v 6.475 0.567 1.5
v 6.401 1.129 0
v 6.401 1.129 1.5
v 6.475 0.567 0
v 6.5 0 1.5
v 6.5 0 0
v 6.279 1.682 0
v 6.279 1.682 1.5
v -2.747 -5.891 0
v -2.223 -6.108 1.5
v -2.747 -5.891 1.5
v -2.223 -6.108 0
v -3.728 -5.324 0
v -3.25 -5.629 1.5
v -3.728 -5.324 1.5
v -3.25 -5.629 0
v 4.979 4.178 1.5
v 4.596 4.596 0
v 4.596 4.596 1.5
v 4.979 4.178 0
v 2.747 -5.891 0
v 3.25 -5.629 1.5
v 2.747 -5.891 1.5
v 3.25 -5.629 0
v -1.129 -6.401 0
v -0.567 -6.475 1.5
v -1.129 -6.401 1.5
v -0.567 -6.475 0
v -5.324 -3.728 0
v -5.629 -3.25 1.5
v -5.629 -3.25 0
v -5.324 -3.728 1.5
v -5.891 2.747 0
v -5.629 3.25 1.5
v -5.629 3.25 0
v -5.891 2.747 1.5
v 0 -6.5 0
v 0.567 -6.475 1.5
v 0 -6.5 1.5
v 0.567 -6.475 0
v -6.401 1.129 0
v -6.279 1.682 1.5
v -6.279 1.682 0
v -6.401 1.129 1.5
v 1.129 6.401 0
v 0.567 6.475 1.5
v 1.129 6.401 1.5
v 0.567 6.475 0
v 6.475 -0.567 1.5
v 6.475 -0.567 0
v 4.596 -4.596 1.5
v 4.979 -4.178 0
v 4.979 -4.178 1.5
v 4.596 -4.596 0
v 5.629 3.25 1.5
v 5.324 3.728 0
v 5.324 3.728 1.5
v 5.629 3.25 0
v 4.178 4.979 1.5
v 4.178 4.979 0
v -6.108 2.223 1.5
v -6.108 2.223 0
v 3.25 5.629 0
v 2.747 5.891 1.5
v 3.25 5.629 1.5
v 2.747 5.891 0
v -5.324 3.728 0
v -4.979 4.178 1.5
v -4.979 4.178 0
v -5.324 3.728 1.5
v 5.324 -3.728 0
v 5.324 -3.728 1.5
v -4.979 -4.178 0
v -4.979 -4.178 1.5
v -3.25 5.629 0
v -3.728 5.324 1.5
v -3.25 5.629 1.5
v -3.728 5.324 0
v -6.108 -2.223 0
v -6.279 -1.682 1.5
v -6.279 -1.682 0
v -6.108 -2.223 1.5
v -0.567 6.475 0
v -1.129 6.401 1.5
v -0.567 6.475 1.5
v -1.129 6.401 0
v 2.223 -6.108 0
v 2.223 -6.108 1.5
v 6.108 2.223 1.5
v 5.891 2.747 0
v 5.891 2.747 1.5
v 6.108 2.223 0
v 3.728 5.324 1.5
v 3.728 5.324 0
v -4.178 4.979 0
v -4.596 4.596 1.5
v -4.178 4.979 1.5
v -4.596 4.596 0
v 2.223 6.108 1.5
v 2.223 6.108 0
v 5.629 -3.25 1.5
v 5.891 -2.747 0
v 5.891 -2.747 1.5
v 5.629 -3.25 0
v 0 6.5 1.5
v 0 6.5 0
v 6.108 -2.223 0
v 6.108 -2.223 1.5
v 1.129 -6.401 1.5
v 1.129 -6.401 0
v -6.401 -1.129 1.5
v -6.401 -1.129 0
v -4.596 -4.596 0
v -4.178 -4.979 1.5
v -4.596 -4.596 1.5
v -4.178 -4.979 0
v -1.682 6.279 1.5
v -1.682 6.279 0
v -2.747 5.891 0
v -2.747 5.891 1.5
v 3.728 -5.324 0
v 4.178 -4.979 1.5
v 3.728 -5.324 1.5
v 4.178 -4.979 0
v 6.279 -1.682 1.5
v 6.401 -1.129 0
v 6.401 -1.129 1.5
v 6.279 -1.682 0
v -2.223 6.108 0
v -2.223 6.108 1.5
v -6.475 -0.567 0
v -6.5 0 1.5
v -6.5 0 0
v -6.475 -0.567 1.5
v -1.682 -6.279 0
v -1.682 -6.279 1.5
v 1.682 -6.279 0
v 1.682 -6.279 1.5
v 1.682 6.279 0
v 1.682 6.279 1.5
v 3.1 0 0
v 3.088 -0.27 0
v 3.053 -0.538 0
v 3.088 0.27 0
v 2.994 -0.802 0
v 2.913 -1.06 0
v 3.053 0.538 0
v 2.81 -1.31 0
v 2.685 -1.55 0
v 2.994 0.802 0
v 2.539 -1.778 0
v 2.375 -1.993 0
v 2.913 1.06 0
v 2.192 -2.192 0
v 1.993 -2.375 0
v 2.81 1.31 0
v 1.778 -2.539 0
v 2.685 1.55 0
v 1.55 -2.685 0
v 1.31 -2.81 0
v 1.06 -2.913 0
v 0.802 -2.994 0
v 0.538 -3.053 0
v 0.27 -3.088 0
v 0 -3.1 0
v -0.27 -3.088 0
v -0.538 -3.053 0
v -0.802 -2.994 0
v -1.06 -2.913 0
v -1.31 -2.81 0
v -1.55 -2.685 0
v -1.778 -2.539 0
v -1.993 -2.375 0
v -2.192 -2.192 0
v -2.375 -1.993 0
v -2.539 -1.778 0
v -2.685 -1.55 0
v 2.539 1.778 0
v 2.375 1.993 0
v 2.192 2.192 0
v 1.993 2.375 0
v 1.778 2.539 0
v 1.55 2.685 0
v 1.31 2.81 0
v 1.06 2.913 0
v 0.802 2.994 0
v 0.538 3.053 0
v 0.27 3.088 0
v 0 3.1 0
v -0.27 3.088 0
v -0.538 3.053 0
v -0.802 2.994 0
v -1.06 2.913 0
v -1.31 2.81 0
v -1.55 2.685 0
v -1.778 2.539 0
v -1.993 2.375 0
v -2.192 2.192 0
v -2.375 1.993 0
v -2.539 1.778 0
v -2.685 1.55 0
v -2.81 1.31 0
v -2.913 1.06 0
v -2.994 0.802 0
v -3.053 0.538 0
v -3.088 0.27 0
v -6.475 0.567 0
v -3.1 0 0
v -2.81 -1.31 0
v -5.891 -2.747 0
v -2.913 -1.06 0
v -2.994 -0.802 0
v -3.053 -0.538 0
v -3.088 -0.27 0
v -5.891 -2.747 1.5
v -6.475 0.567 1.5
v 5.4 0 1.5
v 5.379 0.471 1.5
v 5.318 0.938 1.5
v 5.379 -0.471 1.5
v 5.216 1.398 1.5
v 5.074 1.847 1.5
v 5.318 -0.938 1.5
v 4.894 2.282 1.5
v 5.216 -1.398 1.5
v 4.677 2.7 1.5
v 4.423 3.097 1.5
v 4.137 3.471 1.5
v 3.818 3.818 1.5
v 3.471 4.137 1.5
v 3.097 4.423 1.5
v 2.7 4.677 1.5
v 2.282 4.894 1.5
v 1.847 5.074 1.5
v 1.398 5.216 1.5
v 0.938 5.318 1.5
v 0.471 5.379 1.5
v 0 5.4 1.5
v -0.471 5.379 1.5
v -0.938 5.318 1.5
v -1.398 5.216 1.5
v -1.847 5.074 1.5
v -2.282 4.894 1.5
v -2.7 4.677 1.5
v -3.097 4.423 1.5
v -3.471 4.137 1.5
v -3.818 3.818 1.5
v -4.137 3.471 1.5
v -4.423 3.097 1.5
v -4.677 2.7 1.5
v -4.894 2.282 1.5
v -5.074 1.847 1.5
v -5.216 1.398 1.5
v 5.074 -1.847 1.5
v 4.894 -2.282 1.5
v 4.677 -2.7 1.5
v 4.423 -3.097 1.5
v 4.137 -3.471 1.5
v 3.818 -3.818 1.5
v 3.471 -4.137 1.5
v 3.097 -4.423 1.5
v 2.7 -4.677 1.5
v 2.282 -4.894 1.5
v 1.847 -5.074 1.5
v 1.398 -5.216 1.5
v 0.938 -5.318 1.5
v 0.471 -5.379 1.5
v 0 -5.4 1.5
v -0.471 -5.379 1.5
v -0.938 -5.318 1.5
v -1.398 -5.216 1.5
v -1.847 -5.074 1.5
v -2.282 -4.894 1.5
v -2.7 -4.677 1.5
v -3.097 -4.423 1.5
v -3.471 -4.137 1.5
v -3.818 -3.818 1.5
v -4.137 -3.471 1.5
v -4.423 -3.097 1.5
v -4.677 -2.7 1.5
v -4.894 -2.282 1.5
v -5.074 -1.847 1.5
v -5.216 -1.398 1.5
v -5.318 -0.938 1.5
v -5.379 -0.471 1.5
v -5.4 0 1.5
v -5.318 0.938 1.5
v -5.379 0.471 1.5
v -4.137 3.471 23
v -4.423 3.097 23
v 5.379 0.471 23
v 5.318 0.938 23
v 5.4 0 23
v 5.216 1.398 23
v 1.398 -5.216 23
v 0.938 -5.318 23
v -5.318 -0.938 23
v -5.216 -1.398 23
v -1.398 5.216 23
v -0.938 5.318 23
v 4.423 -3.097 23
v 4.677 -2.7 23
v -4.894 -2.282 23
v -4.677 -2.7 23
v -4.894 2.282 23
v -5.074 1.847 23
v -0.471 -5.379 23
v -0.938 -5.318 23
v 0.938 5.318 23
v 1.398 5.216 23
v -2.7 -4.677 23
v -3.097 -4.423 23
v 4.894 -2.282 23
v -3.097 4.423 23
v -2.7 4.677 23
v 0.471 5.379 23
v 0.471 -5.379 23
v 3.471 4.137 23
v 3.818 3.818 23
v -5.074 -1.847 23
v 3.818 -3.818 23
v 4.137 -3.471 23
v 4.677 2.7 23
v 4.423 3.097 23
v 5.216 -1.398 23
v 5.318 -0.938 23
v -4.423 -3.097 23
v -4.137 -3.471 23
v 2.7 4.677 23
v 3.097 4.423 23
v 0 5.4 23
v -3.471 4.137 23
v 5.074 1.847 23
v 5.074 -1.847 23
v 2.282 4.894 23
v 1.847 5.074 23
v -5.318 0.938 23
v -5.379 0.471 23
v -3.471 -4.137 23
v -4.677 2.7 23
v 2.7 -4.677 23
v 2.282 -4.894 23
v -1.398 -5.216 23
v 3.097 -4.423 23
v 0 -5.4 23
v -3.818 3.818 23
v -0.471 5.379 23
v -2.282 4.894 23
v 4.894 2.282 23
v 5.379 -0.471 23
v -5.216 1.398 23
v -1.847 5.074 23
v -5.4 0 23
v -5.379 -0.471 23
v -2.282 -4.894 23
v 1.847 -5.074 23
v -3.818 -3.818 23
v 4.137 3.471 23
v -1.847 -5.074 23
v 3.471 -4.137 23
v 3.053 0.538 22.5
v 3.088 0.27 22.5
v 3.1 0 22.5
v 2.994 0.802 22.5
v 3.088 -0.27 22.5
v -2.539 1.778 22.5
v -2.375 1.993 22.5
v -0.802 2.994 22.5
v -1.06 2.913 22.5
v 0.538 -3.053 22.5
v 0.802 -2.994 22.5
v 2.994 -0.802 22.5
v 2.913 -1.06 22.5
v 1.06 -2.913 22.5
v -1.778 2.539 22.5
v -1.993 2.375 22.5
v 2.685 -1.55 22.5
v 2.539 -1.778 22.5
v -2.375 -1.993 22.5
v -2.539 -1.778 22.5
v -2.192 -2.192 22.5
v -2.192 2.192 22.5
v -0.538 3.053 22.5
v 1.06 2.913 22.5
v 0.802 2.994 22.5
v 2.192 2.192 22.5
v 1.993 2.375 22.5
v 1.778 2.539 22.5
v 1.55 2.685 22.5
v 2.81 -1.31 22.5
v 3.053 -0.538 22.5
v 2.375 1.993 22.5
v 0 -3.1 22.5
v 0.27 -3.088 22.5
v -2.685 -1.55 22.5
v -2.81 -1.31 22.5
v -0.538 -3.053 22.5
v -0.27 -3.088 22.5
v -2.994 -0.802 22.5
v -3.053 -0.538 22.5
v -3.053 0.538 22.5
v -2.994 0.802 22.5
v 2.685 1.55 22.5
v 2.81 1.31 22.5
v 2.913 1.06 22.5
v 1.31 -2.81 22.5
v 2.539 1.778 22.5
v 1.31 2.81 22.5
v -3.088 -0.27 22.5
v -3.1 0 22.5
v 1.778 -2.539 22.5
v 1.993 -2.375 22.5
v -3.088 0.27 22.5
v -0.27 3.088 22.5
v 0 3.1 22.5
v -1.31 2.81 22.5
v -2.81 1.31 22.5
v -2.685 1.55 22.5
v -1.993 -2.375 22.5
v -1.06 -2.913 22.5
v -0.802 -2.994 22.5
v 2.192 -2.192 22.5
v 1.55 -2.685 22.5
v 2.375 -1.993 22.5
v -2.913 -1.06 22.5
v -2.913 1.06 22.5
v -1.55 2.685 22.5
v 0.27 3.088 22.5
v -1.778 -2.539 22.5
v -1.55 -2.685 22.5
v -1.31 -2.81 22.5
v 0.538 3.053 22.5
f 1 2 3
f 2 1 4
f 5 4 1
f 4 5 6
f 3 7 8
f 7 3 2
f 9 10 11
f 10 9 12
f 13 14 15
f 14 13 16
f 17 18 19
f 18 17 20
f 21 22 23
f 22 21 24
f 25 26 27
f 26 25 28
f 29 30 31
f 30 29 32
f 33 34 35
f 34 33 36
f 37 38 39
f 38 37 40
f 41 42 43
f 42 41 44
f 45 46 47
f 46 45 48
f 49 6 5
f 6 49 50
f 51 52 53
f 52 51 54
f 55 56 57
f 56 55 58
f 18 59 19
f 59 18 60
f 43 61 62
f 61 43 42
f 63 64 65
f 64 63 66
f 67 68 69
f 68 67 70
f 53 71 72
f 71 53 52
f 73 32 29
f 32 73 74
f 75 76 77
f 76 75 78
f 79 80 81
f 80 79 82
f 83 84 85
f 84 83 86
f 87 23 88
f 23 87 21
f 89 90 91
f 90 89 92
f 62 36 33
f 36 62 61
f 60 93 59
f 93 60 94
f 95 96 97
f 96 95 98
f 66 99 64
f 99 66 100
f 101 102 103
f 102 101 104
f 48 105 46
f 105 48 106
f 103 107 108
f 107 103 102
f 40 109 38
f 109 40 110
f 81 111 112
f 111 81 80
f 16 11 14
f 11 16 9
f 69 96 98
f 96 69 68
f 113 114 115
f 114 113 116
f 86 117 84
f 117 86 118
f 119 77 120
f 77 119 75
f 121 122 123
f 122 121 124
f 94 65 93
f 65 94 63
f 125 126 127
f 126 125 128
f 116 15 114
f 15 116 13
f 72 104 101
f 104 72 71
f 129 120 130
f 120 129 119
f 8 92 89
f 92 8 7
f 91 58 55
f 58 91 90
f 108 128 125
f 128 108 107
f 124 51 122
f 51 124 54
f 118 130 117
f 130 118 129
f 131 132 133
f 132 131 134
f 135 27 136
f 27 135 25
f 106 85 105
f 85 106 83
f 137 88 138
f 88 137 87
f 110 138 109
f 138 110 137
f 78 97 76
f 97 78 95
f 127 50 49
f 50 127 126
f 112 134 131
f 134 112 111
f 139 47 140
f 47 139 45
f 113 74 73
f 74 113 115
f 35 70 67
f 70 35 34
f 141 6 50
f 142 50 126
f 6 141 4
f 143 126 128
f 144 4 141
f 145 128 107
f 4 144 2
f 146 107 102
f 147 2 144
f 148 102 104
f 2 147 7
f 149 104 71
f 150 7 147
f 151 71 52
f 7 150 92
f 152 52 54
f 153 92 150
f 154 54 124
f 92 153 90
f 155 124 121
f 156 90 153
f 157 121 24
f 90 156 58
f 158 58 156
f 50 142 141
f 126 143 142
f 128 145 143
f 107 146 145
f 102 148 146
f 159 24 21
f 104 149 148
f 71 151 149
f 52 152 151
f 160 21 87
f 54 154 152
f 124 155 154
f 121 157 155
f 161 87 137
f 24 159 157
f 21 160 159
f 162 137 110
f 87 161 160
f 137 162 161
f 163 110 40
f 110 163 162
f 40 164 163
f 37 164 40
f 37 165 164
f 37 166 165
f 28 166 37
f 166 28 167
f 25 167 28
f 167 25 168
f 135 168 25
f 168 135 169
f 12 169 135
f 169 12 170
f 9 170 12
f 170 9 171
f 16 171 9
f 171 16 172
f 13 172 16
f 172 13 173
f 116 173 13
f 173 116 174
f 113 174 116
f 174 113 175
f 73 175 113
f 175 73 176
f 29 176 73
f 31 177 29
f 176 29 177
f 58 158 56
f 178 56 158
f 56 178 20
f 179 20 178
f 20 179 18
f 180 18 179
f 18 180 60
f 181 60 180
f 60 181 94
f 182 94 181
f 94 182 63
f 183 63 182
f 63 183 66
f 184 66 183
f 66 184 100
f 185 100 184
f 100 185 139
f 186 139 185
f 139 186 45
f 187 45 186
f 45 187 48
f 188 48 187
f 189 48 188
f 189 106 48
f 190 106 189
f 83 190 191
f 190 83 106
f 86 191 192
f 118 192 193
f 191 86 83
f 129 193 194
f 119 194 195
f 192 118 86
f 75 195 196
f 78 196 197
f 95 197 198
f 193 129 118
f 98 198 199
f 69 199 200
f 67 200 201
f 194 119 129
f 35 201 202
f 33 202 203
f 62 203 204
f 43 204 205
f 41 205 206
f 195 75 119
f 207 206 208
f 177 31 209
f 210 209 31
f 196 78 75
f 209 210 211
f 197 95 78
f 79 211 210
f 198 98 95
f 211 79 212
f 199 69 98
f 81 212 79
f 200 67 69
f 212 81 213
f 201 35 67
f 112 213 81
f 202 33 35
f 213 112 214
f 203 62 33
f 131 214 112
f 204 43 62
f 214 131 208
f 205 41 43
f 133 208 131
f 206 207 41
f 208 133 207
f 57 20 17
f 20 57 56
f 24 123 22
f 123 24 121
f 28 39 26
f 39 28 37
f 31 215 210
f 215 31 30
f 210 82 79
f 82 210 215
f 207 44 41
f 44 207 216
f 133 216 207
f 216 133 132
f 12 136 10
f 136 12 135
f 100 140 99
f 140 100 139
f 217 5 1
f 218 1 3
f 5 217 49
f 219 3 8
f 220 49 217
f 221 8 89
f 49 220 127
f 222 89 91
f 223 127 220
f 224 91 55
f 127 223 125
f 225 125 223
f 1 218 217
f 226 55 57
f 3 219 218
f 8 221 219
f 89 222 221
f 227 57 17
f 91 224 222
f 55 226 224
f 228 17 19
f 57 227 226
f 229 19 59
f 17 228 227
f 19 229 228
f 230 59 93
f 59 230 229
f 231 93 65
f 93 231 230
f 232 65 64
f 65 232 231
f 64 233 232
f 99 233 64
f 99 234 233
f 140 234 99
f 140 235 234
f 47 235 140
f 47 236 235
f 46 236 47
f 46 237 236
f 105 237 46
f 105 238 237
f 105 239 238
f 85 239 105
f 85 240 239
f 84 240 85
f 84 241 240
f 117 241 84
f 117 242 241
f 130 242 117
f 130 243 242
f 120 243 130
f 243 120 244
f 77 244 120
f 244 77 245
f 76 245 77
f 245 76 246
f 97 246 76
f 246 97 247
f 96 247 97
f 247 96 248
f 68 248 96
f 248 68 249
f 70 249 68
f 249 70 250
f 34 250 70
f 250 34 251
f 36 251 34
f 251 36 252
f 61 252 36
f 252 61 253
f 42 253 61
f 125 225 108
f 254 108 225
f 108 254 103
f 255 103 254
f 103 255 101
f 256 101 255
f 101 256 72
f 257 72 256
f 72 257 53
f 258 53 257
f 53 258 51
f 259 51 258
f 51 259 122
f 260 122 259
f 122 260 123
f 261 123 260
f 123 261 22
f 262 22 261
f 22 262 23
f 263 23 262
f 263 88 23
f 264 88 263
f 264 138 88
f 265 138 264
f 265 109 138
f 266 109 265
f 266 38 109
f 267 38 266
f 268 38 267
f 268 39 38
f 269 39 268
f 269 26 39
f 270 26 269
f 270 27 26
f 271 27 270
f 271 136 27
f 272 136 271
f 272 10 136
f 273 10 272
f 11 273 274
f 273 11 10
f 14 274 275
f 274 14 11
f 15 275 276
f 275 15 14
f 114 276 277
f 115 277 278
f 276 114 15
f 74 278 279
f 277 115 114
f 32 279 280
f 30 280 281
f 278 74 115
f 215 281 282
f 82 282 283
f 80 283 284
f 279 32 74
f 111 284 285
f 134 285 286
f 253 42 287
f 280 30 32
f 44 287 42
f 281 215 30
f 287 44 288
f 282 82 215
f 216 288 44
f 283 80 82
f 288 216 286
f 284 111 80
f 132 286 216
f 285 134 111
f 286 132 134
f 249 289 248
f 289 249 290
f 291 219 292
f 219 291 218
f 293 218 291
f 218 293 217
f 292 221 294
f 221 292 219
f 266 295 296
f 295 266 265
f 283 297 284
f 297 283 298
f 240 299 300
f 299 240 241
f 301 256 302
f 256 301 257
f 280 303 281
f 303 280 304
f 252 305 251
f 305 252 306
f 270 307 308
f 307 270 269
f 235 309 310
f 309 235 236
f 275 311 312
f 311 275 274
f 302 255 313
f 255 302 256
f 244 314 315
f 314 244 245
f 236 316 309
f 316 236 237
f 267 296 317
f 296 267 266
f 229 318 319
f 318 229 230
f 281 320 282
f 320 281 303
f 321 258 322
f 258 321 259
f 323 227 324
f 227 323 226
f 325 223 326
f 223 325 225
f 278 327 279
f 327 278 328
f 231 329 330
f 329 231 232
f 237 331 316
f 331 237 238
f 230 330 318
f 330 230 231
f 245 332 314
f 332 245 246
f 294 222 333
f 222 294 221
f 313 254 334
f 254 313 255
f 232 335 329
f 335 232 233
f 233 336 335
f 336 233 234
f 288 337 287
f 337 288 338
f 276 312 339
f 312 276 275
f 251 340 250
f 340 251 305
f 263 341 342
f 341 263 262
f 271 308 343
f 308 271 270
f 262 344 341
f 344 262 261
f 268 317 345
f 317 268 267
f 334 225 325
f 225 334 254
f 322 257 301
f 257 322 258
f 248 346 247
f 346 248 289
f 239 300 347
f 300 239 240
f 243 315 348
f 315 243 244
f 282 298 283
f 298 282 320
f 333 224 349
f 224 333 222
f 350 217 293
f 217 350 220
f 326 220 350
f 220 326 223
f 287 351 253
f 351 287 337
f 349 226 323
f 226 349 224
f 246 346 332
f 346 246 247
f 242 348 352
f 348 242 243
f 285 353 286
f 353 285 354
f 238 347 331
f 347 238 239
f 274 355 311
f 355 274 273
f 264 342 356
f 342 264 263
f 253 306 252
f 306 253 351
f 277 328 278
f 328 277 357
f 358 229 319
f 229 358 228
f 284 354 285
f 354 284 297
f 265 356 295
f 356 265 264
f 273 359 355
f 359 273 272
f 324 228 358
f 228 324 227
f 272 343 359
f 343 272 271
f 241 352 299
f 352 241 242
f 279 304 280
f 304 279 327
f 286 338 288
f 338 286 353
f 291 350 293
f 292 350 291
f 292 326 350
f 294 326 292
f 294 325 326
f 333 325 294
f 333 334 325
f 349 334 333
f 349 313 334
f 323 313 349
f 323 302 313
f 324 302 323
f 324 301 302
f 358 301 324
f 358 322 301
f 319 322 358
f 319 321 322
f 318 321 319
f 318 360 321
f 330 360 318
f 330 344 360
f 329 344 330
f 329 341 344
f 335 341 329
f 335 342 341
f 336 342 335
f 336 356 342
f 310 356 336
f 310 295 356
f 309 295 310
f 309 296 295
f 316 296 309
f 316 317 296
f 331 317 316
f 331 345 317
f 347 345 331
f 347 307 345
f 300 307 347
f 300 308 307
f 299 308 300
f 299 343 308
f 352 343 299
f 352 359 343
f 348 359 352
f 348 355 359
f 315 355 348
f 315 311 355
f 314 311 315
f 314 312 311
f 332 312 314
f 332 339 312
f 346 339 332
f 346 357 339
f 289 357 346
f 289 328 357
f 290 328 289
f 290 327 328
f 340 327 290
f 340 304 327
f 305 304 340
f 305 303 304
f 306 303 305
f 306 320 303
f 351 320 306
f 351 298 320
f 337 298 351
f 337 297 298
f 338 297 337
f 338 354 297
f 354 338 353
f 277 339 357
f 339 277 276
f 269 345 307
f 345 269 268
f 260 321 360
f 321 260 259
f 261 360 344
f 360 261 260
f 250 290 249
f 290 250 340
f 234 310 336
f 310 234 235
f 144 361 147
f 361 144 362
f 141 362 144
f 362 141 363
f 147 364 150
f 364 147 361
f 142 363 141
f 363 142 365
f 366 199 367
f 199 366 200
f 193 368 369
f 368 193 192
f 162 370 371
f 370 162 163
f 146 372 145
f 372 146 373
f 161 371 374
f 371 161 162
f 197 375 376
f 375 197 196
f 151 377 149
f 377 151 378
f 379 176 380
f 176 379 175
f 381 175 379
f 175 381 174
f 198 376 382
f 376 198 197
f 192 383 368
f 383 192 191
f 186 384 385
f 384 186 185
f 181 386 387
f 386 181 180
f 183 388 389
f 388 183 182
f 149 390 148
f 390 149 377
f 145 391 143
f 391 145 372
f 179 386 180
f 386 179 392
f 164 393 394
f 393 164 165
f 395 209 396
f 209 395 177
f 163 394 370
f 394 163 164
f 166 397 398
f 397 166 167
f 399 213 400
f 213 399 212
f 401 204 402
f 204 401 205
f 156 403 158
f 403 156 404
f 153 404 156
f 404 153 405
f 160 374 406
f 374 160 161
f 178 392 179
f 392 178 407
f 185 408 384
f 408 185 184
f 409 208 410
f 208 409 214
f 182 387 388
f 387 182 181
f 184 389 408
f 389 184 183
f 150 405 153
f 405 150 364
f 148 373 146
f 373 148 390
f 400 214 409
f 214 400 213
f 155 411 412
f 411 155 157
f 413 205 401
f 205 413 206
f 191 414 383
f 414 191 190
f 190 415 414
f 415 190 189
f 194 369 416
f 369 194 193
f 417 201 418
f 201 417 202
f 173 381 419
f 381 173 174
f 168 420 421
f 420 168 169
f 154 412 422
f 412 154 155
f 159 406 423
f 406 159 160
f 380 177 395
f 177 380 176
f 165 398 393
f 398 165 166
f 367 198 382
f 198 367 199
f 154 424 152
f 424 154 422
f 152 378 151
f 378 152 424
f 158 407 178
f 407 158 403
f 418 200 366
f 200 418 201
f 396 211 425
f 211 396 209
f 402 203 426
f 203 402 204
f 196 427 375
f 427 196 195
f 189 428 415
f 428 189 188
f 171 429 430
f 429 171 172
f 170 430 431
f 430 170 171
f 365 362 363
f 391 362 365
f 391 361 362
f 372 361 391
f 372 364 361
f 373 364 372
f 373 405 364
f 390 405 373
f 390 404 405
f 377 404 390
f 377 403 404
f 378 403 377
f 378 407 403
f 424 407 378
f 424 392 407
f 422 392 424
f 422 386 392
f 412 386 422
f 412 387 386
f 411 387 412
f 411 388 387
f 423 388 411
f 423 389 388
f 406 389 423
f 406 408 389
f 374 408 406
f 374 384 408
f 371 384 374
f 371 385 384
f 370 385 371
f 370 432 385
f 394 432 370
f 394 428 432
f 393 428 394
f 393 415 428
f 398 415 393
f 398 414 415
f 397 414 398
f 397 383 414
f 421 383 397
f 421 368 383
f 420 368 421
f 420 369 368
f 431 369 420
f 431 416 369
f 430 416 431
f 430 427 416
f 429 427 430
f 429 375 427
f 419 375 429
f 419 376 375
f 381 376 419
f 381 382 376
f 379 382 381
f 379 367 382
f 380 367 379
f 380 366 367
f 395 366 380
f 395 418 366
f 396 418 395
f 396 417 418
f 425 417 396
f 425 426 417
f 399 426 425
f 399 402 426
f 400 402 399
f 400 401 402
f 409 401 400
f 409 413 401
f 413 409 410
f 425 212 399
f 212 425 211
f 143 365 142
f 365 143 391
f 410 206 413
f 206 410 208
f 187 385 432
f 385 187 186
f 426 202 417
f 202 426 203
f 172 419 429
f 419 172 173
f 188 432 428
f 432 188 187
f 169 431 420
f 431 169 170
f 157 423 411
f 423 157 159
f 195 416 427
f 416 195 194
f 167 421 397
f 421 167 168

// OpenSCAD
// Adapter sleeve - a collar and sleeve body that lets a 0.2 mL PCR tube sit in a
// rack hole made for 1.5 mL tubes. Prints upside down with a collard collar on the
// bed (z = 0..1.5) and a sleeve body rising to z = 21.5 with a straight bore
// through it.

tube  = 0.2;
rack_h  = 1.5;
sleeve_h  = 21.5;
bore_d  = 6.2;

$fn = 72;

collar_d = 13;
sleeve_d = 10.8;

difference() {
    union() {
        cylinder(h = rack_h, d = collar_d);
        translate([0, 0, rack_h]) cylinder(h = sleeve_h, d = sleeve_d);
    }
    translate([0, 0, -1]) cylinder(h = sleeve_h + 2, d = bore_d);
}
